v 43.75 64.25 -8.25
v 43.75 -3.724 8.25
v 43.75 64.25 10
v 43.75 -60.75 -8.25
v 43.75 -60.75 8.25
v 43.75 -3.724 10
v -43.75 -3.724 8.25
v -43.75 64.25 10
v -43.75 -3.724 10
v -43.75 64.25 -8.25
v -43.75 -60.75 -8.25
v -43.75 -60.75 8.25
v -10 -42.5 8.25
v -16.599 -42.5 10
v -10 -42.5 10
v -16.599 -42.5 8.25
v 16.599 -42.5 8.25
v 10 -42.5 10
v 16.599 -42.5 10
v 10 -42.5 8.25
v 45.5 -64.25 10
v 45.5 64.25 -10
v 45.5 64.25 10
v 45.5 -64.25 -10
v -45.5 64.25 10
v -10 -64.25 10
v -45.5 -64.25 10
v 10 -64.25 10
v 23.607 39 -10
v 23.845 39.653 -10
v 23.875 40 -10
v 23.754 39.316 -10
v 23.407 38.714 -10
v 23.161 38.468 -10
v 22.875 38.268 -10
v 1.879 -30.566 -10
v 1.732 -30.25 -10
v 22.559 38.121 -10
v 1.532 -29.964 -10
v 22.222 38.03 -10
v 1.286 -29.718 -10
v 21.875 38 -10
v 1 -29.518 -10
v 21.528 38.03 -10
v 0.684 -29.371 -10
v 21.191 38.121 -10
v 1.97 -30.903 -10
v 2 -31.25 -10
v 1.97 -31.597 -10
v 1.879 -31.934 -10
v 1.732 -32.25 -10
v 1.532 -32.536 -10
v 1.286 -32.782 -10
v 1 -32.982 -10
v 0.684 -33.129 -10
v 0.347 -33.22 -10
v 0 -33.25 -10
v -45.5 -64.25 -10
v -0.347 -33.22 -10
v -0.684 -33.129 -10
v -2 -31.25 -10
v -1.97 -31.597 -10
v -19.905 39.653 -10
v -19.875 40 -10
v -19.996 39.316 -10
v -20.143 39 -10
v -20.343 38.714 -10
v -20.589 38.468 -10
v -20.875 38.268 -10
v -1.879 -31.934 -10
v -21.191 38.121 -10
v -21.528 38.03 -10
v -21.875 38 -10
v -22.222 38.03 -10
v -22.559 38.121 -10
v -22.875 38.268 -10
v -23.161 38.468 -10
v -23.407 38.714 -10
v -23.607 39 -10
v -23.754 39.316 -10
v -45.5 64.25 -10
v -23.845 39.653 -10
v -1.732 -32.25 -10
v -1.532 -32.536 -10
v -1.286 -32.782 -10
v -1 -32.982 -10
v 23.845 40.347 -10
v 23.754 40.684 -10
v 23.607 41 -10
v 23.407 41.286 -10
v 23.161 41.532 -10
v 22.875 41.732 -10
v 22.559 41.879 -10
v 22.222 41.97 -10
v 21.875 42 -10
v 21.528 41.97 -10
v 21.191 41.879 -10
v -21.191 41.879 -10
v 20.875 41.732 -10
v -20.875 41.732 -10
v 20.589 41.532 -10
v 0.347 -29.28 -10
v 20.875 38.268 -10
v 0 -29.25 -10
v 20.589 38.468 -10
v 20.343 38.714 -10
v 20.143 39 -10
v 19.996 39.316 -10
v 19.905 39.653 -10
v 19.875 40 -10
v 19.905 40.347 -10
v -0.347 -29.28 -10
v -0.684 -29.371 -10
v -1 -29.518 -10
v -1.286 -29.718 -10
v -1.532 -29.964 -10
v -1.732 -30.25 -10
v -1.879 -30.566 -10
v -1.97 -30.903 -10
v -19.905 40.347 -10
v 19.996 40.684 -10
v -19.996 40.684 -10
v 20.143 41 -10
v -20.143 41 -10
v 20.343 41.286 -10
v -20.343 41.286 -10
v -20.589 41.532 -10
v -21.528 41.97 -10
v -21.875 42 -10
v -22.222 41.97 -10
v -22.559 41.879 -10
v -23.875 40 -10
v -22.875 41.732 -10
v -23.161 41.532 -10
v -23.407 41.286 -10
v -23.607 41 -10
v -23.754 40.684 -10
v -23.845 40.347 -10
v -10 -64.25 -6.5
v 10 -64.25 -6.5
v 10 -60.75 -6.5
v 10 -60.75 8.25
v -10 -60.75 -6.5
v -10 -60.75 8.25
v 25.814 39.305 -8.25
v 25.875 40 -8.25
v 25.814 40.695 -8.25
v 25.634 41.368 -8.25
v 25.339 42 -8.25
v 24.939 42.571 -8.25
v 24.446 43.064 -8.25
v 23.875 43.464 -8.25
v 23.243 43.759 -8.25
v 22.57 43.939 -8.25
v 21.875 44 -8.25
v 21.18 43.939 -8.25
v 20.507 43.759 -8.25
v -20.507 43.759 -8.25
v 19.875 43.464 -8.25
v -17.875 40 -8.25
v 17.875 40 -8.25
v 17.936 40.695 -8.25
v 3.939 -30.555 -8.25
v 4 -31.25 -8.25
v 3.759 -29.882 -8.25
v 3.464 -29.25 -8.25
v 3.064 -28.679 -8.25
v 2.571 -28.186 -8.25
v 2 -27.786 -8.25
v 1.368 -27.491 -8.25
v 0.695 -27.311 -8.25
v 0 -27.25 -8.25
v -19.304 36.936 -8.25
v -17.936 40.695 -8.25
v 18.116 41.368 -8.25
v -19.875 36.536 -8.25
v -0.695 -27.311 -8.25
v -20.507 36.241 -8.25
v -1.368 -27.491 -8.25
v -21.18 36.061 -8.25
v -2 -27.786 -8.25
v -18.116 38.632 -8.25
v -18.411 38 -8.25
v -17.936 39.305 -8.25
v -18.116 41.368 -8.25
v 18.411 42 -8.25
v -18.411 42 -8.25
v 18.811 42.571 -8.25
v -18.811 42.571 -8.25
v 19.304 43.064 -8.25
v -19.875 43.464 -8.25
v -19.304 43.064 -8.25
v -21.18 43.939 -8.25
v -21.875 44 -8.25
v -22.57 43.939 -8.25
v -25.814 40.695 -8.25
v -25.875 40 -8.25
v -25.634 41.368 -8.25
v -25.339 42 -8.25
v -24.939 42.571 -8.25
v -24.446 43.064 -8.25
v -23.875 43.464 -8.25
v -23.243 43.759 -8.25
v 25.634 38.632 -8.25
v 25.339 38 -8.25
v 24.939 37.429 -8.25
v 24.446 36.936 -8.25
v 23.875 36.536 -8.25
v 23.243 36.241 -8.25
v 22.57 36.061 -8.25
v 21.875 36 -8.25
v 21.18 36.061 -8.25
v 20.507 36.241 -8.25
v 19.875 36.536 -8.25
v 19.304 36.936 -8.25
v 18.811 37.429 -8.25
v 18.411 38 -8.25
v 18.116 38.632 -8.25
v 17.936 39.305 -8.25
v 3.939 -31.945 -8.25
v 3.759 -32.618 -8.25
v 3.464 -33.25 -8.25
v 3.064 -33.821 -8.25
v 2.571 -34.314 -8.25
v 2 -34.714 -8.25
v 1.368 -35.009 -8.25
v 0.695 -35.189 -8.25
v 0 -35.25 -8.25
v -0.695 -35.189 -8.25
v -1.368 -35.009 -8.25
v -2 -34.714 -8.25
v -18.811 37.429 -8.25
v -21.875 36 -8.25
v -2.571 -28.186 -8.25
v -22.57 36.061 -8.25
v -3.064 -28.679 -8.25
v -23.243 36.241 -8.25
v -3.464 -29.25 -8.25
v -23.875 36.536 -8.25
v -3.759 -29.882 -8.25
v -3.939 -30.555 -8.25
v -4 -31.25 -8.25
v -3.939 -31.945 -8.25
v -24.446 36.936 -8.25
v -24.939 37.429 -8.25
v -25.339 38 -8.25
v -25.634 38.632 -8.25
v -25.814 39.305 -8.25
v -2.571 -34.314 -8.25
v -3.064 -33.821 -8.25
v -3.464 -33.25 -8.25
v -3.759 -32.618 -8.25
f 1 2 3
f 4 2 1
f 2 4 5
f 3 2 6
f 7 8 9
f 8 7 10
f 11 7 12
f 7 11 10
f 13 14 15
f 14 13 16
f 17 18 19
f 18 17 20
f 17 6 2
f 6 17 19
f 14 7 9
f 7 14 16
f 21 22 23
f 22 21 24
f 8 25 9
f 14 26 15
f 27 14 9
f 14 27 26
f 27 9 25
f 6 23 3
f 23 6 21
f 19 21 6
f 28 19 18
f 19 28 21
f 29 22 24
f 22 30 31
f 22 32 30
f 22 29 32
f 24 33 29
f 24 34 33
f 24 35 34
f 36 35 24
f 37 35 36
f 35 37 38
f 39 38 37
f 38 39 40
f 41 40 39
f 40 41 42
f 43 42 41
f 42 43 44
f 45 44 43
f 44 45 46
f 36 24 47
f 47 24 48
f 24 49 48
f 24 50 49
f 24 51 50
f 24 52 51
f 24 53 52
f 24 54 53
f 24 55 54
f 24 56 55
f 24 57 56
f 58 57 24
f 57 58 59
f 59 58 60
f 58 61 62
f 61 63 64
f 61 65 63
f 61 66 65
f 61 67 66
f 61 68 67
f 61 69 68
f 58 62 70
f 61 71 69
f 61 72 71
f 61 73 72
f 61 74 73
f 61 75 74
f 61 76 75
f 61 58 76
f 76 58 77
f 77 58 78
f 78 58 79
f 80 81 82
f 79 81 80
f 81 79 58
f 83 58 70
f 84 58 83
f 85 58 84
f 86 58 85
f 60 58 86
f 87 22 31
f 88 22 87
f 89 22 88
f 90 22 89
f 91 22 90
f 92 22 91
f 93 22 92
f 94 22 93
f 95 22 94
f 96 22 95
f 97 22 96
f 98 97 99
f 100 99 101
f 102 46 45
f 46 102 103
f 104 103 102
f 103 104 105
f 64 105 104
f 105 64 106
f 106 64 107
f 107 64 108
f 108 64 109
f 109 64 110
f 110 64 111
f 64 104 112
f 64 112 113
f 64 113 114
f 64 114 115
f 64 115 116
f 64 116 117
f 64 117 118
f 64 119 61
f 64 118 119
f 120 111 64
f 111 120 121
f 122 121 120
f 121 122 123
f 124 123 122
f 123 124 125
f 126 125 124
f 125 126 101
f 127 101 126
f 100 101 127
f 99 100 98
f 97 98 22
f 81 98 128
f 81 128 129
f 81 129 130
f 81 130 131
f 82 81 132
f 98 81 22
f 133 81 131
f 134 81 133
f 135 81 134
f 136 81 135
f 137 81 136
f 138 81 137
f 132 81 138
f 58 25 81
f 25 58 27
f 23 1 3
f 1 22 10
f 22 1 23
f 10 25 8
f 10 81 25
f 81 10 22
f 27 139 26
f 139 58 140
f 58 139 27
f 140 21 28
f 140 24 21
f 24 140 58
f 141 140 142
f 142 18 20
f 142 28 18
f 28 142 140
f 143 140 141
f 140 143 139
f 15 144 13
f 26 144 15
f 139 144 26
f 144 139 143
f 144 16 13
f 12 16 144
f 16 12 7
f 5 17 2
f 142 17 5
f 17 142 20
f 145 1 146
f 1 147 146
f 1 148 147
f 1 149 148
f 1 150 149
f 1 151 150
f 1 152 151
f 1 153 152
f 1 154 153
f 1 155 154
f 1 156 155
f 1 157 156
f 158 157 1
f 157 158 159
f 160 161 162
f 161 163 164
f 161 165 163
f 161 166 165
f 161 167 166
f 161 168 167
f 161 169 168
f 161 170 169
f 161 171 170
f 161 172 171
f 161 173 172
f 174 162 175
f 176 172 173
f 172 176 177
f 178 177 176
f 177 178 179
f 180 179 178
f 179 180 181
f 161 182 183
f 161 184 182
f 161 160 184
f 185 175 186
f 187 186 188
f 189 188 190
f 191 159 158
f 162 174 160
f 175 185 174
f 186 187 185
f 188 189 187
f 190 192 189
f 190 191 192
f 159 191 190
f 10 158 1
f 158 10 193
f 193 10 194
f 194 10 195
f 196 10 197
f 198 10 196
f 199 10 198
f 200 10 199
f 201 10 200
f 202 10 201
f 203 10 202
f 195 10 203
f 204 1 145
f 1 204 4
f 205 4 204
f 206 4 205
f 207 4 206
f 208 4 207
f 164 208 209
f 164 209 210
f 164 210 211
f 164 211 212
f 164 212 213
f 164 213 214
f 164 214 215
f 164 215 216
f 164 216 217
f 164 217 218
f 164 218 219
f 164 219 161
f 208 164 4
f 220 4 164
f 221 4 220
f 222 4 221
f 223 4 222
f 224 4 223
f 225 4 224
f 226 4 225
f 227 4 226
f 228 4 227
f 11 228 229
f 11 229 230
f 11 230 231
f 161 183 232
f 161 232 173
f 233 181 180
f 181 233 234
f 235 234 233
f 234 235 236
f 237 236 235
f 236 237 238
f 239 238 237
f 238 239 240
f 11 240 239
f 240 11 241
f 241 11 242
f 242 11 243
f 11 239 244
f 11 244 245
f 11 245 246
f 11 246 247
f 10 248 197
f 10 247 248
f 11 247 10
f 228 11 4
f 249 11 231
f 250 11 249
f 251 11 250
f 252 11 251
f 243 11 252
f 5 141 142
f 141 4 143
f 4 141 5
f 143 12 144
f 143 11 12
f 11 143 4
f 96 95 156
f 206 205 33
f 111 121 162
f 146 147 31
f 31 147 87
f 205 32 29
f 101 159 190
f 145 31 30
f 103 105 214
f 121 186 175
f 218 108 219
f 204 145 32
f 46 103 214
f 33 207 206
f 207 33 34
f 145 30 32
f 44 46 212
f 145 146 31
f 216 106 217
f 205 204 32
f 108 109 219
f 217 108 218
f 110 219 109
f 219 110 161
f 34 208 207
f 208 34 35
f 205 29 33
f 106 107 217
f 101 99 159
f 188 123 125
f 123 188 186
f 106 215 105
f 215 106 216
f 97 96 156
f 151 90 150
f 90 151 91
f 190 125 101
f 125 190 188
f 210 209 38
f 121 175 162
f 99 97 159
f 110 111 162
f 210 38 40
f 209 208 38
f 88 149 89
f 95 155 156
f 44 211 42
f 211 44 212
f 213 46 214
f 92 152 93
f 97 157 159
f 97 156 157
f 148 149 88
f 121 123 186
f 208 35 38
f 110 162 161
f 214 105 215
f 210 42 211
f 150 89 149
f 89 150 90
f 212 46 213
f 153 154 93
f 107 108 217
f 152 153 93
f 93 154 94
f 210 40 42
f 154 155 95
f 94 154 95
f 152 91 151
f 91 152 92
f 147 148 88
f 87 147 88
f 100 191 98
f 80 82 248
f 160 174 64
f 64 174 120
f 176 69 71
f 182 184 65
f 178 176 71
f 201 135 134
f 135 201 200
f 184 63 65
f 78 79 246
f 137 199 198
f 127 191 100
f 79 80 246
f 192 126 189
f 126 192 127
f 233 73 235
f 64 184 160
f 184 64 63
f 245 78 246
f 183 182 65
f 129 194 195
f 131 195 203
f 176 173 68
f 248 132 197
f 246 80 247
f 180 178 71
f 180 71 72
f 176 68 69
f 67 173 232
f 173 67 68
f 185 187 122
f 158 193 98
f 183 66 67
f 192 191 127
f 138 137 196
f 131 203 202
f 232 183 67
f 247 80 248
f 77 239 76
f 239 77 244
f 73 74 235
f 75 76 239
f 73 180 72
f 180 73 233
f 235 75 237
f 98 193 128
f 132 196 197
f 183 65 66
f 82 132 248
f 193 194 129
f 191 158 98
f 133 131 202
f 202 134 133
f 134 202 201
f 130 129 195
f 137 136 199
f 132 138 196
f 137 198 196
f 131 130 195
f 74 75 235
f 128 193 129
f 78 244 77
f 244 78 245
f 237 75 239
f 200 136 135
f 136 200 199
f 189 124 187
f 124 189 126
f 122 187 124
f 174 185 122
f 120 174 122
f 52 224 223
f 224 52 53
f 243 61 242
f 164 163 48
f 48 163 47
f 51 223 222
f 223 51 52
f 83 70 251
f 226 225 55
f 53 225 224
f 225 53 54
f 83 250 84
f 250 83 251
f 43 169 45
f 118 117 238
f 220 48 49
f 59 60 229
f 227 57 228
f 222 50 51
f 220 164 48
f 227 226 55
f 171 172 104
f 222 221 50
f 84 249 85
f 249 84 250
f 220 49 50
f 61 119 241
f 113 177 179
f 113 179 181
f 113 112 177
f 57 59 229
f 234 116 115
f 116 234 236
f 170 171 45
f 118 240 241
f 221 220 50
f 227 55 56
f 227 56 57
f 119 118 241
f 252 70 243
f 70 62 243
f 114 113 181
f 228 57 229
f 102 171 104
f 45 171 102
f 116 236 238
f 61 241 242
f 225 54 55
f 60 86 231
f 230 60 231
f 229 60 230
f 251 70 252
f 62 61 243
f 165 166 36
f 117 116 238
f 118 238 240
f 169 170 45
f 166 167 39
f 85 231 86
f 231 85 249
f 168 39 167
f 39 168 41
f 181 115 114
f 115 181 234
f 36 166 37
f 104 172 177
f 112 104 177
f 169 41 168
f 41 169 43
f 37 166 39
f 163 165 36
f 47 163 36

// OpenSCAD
phone_width = 87.5;
phone_height = 125;  // actually taller but we don't care, we're not enclosing the top
phone_depth = 16.5;
power_opening = 20;
wall_width = 3.5;

difference()
{
    cube([phone_width + wall_width, phone_height + wall_width, phone_depth + wall_width], center=true);

    translate([0, 20, wall_width])
        difference() {
            cube([phone_width, phone_height, phone_depth], center=true);
            translate([phone_width /2, -phone_height/1.25, 0])
                rotate([0, 0, -35]) 
                    cube([phone_width, phone_height, phone_depth], center=true);
            translate([-phone_width /2, -phone_height/1.25, 0])
                rotate([0, 0, 35]) 
                    cube([phone_width, phone_height, phone_depth], center=true);
        }

    translate([0, -wall_width, wall_width])
        cube([power_opening, phone_height, phone_depth + wall_width], center=true);

    translate([0, wall_width, 0])
        cube([phone_width, phone_height + wall_width, phone_depth], center=true);
    
    translate([phone_width / 4, 40, -phone_depth/2 -wall_width/4]) 
        #cylinder(h=wall_width/2, r1=2, r2=4, $fn=36, center=true);
    
    translate([-phone_width / 4, 40, -phone_depth/2 -wall_width/4]) 
        cylinder(h=wall_width/2, r1=2, r2=4, $fn=36, center=true);

    translate([0, -phone_height/4, -phone_depth/2 -wall_width/4]) 
        cylinder(h=wall_width/2, r1=2, r2=4, $fn=36, center=true);

}
